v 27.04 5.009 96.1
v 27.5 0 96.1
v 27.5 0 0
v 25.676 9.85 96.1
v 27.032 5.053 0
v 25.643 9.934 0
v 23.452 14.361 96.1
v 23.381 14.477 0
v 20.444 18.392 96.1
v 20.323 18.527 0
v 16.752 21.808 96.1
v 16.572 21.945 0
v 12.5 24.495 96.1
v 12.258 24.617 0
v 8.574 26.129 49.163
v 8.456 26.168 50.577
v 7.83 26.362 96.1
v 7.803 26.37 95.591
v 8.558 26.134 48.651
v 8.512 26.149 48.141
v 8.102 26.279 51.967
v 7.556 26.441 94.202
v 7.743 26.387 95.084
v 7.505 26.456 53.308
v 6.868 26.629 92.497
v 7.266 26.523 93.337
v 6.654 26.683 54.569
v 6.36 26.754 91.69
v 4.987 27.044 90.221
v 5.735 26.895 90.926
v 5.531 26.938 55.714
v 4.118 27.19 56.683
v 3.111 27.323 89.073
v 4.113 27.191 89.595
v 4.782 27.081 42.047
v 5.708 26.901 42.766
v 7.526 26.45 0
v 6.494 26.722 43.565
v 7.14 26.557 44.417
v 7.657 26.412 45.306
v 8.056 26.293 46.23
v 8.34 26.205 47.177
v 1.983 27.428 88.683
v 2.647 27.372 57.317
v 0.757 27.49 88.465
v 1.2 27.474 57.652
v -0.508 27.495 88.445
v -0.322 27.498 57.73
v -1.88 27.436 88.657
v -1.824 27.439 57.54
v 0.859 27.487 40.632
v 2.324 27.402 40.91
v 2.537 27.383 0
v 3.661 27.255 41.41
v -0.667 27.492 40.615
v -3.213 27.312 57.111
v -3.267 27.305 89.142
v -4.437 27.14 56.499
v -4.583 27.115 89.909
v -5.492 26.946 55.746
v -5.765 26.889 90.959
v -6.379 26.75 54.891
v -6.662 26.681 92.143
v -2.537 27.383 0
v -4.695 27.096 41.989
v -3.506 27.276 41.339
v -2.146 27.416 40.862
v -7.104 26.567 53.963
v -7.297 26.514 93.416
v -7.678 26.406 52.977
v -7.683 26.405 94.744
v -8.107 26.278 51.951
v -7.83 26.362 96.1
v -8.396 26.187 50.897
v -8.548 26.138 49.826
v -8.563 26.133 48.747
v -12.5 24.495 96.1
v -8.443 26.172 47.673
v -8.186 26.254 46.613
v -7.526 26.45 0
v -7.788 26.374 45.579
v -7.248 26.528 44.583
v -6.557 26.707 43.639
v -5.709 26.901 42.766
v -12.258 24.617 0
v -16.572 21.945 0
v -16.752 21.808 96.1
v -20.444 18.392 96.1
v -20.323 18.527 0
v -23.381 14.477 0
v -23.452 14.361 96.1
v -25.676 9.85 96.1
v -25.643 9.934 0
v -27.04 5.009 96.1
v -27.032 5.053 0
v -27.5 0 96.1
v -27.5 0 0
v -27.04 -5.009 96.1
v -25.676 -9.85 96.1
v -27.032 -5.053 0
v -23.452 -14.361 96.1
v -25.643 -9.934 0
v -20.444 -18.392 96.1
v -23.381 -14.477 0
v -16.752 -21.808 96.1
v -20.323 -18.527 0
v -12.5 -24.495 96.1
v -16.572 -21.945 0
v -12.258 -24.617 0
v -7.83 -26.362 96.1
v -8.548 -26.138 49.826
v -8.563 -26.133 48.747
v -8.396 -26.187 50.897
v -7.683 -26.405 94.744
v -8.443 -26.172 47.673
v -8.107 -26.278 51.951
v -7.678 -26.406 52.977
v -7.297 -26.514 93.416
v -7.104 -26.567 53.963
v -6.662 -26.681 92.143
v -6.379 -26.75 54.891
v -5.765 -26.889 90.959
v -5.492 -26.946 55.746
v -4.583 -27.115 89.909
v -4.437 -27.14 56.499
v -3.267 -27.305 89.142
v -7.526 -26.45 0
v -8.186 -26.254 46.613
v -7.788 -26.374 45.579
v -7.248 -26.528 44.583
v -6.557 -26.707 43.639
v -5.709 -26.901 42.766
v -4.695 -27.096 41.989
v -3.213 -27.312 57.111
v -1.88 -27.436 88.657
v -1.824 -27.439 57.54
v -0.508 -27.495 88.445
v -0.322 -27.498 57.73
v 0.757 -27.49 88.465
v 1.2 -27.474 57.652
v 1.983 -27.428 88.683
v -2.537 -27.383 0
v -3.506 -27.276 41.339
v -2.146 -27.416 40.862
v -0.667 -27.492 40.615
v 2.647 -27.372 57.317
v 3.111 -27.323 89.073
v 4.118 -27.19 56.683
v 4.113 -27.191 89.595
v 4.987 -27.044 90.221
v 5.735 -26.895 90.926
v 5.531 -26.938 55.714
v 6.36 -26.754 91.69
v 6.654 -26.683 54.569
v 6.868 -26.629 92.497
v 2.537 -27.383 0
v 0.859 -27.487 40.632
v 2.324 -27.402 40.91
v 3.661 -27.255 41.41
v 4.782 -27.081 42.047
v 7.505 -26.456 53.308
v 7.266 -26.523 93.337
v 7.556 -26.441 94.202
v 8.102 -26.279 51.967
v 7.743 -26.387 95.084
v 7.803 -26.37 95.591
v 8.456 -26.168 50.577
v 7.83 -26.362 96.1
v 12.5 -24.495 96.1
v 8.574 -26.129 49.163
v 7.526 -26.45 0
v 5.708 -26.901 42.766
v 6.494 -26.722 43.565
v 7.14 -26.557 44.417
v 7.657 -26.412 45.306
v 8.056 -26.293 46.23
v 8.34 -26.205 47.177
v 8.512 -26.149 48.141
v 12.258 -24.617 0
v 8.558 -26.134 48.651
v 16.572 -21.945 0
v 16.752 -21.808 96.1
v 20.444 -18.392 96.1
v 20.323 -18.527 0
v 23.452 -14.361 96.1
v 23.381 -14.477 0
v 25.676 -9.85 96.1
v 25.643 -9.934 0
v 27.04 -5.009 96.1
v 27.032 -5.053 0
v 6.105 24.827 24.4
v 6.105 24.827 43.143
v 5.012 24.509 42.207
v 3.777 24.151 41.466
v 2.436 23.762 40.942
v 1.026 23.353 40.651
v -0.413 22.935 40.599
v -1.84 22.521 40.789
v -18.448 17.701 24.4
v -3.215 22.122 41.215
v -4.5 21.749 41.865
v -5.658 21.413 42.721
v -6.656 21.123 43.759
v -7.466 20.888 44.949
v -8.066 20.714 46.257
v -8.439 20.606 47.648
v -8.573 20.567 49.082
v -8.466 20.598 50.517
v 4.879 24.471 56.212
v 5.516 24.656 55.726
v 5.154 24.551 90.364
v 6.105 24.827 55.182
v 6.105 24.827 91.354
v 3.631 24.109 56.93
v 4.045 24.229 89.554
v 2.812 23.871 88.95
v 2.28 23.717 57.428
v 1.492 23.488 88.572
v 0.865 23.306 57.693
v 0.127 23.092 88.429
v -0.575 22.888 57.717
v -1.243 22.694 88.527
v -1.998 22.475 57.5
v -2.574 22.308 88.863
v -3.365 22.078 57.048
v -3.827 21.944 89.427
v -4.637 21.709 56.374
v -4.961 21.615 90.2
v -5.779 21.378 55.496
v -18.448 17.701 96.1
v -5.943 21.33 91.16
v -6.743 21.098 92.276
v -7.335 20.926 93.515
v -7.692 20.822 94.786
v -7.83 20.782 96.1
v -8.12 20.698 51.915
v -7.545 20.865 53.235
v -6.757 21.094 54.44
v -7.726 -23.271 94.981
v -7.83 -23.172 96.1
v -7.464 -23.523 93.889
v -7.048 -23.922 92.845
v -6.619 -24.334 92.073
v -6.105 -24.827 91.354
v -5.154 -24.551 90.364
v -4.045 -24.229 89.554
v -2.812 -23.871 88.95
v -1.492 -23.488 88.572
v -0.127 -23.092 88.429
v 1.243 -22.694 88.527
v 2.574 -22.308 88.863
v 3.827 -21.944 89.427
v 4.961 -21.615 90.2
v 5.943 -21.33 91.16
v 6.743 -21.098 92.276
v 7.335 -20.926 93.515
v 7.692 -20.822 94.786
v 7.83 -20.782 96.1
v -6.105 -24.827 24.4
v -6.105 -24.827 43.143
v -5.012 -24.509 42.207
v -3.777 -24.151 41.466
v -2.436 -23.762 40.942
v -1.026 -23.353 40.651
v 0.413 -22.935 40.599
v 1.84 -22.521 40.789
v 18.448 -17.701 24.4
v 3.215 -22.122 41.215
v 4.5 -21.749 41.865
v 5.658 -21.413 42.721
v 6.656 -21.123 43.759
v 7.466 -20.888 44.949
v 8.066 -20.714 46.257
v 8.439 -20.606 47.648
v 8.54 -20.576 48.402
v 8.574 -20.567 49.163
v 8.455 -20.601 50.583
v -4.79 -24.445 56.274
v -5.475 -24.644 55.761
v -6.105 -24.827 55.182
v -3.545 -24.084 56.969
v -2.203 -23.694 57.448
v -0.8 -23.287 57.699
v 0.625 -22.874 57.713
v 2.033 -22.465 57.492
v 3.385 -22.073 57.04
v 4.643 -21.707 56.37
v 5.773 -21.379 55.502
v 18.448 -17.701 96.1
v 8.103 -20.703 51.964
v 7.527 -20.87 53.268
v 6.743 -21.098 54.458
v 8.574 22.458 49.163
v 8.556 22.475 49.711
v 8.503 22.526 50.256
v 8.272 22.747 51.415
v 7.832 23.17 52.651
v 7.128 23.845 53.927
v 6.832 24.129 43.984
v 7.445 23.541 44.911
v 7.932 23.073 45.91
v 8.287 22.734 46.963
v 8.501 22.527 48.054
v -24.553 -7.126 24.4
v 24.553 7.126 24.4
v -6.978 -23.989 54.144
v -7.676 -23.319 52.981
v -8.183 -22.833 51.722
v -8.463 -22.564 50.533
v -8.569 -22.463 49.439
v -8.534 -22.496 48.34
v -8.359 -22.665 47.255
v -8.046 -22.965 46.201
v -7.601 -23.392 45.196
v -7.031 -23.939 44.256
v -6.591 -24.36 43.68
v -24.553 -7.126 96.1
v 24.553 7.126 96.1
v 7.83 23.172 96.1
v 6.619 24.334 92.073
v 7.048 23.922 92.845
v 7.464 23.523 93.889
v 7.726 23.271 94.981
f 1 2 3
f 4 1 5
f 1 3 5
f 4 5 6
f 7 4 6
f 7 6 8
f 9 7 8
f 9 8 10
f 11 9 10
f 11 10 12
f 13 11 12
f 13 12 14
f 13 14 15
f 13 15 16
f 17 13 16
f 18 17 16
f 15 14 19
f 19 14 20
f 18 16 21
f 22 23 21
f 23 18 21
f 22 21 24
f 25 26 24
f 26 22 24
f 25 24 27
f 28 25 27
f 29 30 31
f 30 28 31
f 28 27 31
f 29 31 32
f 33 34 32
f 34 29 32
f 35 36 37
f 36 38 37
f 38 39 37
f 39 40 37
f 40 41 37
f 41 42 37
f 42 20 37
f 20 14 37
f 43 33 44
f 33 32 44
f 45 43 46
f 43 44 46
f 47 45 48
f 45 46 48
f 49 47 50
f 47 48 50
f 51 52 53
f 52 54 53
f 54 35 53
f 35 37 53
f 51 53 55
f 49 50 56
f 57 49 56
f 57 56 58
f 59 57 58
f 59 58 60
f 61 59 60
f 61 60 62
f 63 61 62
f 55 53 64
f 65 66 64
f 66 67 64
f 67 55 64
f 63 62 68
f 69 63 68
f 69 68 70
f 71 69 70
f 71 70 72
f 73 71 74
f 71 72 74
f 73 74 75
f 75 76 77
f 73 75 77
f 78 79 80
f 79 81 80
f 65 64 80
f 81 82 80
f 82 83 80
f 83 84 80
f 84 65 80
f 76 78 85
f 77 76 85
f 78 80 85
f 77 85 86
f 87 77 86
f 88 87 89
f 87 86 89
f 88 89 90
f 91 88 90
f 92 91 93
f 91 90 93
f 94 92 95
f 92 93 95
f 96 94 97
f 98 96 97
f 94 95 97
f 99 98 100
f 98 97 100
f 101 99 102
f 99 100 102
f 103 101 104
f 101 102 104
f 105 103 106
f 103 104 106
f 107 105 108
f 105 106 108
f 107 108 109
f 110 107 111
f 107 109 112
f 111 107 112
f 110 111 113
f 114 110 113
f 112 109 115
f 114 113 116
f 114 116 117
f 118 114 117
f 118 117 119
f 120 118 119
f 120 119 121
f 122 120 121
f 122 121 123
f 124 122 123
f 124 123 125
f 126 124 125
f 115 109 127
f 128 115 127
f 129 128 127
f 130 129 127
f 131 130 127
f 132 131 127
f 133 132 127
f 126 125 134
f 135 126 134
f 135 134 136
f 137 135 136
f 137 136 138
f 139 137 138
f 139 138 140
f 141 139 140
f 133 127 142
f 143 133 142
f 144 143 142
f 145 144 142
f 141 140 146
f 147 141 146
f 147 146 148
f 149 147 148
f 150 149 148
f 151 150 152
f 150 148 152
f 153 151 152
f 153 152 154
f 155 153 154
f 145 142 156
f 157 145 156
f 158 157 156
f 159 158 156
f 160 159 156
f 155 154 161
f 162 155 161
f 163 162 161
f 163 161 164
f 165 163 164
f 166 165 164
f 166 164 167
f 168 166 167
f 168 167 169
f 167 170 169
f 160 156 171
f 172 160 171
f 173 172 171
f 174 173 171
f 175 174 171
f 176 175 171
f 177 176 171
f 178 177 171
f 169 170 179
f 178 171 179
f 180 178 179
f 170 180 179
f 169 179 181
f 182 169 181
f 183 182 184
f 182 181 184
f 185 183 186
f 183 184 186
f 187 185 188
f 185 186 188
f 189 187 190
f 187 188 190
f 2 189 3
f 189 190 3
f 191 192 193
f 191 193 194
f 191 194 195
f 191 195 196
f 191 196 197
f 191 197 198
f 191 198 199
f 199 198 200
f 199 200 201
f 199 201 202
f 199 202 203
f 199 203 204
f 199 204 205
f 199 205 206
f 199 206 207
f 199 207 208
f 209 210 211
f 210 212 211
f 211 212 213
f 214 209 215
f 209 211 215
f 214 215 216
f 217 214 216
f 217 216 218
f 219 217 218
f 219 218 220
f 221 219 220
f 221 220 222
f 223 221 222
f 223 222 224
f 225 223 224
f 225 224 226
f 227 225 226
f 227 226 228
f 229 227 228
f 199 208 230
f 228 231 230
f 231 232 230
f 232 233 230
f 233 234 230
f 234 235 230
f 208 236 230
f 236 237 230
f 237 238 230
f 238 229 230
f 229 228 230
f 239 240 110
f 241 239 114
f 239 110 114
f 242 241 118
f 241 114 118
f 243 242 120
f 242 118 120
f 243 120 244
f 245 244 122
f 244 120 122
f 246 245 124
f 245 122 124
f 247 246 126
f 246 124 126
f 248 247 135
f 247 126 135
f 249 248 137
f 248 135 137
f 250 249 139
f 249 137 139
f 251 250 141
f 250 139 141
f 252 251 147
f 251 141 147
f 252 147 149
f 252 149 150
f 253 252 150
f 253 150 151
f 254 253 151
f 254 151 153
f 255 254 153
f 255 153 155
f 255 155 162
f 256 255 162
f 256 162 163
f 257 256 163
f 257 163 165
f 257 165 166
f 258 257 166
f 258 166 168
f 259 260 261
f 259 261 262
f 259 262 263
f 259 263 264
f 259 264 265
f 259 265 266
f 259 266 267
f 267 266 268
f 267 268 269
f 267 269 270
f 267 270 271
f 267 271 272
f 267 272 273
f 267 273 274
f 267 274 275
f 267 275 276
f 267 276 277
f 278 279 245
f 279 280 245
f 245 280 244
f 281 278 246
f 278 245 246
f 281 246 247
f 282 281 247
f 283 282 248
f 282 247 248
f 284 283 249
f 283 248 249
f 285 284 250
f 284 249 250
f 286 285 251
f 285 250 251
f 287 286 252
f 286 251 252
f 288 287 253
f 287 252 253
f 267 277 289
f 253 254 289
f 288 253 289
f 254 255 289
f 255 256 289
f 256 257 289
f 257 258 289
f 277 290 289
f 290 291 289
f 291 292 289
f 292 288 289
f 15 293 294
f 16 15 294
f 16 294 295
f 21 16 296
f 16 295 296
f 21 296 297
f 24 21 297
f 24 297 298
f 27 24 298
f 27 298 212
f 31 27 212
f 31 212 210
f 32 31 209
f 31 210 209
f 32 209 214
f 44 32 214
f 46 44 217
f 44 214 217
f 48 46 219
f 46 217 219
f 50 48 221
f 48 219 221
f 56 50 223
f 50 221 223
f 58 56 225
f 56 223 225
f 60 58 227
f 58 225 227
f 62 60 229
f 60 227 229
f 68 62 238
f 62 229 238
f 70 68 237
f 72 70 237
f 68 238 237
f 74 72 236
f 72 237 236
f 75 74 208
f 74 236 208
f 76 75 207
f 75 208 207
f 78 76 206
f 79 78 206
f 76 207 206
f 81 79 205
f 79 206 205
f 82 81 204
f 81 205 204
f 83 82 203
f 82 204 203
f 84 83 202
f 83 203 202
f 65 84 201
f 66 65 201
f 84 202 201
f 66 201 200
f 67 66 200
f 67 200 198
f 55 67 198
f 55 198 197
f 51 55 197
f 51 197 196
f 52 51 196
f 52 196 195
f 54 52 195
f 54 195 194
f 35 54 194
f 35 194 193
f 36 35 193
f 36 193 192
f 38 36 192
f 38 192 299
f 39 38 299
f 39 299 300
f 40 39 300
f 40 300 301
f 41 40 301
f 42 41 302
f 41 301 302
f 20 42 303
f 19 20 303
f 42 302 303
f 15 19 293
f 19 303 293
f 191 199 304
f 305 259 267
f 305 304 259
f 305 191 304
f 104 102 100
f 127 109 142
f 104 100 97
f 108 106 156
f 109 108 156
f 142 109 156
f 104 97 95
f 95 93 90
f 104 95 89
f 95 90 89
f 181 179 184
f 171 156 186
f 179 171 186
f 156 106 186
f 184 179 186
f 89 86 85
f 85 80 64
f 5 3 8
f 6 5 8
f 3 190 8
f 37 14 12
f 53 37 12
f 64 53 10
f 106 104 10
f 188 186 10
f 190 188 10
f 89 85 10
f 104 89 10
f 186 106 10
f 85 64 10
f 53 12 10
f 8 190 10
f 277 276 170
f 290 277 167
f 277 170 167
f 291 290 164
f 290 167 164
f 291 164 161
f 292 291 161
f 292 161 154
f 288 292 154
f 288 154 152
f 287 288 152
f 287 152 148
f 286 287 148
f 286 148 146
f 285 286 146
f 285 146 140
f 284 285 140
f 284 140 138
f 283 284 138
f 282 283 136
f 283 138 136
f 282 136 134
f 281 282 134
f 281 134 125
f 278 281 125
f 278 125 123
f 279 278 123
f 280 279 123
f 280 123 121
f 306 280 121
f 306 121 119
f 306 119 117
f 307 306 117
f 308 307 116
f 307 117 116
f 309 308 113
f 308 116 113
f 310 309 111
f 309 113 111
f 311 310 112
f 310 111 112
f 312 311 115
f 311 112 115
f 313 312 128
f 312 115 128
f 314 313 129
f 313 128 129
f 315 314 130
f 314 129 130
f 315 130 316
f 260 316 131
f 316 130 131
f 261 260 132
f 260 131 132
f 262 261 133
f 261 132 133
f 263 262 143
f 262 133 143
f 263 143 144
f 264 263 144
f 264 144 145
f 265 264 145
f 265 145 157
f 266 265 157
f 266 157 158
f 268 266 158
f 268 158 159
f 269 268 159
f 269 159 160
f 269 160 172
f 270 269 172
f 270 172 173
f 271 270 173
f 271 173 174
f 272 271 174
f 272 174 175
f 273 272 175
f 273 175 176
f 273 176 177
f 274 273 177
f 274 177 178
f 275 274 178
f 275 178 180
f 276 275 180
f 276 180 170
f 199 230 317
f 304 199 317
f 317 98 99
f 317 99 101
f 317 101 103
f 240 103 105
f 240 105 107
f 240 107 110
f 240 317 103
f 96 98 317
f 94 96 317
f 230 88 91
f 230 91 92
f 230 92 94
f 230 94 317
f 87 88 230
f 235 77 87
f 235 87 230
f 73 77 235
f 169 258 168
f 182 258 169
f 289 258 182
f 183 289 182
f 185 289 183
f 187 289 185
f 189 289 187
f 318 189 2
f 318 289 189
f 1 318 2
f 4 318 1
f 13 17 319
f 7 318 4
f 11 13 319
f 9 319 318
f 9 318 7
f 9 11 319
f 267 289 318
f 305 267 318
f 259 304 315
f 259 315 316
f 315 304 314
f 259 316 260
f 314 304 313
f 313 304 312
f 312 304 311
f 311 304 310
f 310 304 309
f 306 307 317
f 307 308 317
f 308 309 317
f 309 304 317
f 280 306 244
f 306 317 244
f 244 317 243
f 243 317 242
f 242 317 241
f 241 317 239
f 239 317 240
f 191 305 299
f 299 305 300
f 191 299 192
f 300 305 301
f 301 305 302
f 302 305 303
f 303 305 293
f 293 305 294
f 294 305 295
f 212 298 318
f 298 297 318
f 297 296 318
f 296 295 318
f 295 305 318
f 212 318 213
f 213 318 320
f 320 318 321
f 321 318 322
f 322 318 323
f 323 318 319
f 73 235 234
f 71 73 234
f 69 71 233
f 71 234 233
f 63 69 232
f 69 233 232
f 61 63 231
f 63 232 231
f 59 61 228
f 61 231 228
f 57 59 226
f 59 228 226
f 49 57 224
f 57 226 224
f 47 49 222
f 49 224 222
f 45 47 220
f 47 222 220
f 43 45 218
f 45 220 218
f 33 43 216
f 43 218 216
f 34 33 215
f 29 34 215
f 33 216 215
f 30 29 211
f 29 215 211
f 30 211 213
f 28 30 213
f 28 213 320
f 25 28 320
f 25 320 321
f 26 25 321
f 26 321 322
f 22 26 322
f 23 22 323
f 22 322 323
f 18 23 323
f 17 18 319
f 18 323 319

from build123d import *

# Parameters (mm, degrees)
F0_R      = 27.5
F1_DEPTH  = 25
F1_FACE_R = 27.5
F2_DEPTH  = 71.1
F4_DEPTH  = 71.7
F6_R      = 7.831507
F7_DEPTH  = 739.1
F8_R      = 8.573523
F9_DEPTH  = 106


with BuildPart() as f1:
    # F0 (on Top) → F1 (new body)
    with BuildSketch(Plane.XY):
        Circle(F0_R)
    extrude(amount=F1_DEPTH)

    # F1_face (on face) → F2 (join)
    with BuildSketch(Plane.XY.offset(25)):
        Circle(F1_FACE_R)
    extrude(amount=F2_DEPTH)

    # F3 (on face) → F4 (cut)
    with BuildSketch(Plane.XY.offset(96.1)):
        Polygon((-6.105004, -24.826832), (18.448165, -17.700505), (24.553169, 7.126327), (6.105004, 24.826832), (-18.448165, 17.700505), (-24.553169, -7.126327), align=None)
    extrude(amount=-F4_DEPTH, mode=Mode.SUBTRACT)

    # F6 (on offset) → F7 (cut)
    with BuildSketch(Plane.XZ.offset(50)):
        with Locations((0, 96.259676)):
            Circle(F6_R)
    extrude(amount=-F7_DEPTH, mode=Mode.SUBTRACT)

    # F8 (on offset) → F9 (cut)
    with BuildSketch(Plane.XZ.offset(50)):
        with Locations((0, 49.162731)):
            Circle(F8_R)
    extrude(amount=-F9_DEPTH, mode=Mode.SUBTRACT)


solid = f1.part
